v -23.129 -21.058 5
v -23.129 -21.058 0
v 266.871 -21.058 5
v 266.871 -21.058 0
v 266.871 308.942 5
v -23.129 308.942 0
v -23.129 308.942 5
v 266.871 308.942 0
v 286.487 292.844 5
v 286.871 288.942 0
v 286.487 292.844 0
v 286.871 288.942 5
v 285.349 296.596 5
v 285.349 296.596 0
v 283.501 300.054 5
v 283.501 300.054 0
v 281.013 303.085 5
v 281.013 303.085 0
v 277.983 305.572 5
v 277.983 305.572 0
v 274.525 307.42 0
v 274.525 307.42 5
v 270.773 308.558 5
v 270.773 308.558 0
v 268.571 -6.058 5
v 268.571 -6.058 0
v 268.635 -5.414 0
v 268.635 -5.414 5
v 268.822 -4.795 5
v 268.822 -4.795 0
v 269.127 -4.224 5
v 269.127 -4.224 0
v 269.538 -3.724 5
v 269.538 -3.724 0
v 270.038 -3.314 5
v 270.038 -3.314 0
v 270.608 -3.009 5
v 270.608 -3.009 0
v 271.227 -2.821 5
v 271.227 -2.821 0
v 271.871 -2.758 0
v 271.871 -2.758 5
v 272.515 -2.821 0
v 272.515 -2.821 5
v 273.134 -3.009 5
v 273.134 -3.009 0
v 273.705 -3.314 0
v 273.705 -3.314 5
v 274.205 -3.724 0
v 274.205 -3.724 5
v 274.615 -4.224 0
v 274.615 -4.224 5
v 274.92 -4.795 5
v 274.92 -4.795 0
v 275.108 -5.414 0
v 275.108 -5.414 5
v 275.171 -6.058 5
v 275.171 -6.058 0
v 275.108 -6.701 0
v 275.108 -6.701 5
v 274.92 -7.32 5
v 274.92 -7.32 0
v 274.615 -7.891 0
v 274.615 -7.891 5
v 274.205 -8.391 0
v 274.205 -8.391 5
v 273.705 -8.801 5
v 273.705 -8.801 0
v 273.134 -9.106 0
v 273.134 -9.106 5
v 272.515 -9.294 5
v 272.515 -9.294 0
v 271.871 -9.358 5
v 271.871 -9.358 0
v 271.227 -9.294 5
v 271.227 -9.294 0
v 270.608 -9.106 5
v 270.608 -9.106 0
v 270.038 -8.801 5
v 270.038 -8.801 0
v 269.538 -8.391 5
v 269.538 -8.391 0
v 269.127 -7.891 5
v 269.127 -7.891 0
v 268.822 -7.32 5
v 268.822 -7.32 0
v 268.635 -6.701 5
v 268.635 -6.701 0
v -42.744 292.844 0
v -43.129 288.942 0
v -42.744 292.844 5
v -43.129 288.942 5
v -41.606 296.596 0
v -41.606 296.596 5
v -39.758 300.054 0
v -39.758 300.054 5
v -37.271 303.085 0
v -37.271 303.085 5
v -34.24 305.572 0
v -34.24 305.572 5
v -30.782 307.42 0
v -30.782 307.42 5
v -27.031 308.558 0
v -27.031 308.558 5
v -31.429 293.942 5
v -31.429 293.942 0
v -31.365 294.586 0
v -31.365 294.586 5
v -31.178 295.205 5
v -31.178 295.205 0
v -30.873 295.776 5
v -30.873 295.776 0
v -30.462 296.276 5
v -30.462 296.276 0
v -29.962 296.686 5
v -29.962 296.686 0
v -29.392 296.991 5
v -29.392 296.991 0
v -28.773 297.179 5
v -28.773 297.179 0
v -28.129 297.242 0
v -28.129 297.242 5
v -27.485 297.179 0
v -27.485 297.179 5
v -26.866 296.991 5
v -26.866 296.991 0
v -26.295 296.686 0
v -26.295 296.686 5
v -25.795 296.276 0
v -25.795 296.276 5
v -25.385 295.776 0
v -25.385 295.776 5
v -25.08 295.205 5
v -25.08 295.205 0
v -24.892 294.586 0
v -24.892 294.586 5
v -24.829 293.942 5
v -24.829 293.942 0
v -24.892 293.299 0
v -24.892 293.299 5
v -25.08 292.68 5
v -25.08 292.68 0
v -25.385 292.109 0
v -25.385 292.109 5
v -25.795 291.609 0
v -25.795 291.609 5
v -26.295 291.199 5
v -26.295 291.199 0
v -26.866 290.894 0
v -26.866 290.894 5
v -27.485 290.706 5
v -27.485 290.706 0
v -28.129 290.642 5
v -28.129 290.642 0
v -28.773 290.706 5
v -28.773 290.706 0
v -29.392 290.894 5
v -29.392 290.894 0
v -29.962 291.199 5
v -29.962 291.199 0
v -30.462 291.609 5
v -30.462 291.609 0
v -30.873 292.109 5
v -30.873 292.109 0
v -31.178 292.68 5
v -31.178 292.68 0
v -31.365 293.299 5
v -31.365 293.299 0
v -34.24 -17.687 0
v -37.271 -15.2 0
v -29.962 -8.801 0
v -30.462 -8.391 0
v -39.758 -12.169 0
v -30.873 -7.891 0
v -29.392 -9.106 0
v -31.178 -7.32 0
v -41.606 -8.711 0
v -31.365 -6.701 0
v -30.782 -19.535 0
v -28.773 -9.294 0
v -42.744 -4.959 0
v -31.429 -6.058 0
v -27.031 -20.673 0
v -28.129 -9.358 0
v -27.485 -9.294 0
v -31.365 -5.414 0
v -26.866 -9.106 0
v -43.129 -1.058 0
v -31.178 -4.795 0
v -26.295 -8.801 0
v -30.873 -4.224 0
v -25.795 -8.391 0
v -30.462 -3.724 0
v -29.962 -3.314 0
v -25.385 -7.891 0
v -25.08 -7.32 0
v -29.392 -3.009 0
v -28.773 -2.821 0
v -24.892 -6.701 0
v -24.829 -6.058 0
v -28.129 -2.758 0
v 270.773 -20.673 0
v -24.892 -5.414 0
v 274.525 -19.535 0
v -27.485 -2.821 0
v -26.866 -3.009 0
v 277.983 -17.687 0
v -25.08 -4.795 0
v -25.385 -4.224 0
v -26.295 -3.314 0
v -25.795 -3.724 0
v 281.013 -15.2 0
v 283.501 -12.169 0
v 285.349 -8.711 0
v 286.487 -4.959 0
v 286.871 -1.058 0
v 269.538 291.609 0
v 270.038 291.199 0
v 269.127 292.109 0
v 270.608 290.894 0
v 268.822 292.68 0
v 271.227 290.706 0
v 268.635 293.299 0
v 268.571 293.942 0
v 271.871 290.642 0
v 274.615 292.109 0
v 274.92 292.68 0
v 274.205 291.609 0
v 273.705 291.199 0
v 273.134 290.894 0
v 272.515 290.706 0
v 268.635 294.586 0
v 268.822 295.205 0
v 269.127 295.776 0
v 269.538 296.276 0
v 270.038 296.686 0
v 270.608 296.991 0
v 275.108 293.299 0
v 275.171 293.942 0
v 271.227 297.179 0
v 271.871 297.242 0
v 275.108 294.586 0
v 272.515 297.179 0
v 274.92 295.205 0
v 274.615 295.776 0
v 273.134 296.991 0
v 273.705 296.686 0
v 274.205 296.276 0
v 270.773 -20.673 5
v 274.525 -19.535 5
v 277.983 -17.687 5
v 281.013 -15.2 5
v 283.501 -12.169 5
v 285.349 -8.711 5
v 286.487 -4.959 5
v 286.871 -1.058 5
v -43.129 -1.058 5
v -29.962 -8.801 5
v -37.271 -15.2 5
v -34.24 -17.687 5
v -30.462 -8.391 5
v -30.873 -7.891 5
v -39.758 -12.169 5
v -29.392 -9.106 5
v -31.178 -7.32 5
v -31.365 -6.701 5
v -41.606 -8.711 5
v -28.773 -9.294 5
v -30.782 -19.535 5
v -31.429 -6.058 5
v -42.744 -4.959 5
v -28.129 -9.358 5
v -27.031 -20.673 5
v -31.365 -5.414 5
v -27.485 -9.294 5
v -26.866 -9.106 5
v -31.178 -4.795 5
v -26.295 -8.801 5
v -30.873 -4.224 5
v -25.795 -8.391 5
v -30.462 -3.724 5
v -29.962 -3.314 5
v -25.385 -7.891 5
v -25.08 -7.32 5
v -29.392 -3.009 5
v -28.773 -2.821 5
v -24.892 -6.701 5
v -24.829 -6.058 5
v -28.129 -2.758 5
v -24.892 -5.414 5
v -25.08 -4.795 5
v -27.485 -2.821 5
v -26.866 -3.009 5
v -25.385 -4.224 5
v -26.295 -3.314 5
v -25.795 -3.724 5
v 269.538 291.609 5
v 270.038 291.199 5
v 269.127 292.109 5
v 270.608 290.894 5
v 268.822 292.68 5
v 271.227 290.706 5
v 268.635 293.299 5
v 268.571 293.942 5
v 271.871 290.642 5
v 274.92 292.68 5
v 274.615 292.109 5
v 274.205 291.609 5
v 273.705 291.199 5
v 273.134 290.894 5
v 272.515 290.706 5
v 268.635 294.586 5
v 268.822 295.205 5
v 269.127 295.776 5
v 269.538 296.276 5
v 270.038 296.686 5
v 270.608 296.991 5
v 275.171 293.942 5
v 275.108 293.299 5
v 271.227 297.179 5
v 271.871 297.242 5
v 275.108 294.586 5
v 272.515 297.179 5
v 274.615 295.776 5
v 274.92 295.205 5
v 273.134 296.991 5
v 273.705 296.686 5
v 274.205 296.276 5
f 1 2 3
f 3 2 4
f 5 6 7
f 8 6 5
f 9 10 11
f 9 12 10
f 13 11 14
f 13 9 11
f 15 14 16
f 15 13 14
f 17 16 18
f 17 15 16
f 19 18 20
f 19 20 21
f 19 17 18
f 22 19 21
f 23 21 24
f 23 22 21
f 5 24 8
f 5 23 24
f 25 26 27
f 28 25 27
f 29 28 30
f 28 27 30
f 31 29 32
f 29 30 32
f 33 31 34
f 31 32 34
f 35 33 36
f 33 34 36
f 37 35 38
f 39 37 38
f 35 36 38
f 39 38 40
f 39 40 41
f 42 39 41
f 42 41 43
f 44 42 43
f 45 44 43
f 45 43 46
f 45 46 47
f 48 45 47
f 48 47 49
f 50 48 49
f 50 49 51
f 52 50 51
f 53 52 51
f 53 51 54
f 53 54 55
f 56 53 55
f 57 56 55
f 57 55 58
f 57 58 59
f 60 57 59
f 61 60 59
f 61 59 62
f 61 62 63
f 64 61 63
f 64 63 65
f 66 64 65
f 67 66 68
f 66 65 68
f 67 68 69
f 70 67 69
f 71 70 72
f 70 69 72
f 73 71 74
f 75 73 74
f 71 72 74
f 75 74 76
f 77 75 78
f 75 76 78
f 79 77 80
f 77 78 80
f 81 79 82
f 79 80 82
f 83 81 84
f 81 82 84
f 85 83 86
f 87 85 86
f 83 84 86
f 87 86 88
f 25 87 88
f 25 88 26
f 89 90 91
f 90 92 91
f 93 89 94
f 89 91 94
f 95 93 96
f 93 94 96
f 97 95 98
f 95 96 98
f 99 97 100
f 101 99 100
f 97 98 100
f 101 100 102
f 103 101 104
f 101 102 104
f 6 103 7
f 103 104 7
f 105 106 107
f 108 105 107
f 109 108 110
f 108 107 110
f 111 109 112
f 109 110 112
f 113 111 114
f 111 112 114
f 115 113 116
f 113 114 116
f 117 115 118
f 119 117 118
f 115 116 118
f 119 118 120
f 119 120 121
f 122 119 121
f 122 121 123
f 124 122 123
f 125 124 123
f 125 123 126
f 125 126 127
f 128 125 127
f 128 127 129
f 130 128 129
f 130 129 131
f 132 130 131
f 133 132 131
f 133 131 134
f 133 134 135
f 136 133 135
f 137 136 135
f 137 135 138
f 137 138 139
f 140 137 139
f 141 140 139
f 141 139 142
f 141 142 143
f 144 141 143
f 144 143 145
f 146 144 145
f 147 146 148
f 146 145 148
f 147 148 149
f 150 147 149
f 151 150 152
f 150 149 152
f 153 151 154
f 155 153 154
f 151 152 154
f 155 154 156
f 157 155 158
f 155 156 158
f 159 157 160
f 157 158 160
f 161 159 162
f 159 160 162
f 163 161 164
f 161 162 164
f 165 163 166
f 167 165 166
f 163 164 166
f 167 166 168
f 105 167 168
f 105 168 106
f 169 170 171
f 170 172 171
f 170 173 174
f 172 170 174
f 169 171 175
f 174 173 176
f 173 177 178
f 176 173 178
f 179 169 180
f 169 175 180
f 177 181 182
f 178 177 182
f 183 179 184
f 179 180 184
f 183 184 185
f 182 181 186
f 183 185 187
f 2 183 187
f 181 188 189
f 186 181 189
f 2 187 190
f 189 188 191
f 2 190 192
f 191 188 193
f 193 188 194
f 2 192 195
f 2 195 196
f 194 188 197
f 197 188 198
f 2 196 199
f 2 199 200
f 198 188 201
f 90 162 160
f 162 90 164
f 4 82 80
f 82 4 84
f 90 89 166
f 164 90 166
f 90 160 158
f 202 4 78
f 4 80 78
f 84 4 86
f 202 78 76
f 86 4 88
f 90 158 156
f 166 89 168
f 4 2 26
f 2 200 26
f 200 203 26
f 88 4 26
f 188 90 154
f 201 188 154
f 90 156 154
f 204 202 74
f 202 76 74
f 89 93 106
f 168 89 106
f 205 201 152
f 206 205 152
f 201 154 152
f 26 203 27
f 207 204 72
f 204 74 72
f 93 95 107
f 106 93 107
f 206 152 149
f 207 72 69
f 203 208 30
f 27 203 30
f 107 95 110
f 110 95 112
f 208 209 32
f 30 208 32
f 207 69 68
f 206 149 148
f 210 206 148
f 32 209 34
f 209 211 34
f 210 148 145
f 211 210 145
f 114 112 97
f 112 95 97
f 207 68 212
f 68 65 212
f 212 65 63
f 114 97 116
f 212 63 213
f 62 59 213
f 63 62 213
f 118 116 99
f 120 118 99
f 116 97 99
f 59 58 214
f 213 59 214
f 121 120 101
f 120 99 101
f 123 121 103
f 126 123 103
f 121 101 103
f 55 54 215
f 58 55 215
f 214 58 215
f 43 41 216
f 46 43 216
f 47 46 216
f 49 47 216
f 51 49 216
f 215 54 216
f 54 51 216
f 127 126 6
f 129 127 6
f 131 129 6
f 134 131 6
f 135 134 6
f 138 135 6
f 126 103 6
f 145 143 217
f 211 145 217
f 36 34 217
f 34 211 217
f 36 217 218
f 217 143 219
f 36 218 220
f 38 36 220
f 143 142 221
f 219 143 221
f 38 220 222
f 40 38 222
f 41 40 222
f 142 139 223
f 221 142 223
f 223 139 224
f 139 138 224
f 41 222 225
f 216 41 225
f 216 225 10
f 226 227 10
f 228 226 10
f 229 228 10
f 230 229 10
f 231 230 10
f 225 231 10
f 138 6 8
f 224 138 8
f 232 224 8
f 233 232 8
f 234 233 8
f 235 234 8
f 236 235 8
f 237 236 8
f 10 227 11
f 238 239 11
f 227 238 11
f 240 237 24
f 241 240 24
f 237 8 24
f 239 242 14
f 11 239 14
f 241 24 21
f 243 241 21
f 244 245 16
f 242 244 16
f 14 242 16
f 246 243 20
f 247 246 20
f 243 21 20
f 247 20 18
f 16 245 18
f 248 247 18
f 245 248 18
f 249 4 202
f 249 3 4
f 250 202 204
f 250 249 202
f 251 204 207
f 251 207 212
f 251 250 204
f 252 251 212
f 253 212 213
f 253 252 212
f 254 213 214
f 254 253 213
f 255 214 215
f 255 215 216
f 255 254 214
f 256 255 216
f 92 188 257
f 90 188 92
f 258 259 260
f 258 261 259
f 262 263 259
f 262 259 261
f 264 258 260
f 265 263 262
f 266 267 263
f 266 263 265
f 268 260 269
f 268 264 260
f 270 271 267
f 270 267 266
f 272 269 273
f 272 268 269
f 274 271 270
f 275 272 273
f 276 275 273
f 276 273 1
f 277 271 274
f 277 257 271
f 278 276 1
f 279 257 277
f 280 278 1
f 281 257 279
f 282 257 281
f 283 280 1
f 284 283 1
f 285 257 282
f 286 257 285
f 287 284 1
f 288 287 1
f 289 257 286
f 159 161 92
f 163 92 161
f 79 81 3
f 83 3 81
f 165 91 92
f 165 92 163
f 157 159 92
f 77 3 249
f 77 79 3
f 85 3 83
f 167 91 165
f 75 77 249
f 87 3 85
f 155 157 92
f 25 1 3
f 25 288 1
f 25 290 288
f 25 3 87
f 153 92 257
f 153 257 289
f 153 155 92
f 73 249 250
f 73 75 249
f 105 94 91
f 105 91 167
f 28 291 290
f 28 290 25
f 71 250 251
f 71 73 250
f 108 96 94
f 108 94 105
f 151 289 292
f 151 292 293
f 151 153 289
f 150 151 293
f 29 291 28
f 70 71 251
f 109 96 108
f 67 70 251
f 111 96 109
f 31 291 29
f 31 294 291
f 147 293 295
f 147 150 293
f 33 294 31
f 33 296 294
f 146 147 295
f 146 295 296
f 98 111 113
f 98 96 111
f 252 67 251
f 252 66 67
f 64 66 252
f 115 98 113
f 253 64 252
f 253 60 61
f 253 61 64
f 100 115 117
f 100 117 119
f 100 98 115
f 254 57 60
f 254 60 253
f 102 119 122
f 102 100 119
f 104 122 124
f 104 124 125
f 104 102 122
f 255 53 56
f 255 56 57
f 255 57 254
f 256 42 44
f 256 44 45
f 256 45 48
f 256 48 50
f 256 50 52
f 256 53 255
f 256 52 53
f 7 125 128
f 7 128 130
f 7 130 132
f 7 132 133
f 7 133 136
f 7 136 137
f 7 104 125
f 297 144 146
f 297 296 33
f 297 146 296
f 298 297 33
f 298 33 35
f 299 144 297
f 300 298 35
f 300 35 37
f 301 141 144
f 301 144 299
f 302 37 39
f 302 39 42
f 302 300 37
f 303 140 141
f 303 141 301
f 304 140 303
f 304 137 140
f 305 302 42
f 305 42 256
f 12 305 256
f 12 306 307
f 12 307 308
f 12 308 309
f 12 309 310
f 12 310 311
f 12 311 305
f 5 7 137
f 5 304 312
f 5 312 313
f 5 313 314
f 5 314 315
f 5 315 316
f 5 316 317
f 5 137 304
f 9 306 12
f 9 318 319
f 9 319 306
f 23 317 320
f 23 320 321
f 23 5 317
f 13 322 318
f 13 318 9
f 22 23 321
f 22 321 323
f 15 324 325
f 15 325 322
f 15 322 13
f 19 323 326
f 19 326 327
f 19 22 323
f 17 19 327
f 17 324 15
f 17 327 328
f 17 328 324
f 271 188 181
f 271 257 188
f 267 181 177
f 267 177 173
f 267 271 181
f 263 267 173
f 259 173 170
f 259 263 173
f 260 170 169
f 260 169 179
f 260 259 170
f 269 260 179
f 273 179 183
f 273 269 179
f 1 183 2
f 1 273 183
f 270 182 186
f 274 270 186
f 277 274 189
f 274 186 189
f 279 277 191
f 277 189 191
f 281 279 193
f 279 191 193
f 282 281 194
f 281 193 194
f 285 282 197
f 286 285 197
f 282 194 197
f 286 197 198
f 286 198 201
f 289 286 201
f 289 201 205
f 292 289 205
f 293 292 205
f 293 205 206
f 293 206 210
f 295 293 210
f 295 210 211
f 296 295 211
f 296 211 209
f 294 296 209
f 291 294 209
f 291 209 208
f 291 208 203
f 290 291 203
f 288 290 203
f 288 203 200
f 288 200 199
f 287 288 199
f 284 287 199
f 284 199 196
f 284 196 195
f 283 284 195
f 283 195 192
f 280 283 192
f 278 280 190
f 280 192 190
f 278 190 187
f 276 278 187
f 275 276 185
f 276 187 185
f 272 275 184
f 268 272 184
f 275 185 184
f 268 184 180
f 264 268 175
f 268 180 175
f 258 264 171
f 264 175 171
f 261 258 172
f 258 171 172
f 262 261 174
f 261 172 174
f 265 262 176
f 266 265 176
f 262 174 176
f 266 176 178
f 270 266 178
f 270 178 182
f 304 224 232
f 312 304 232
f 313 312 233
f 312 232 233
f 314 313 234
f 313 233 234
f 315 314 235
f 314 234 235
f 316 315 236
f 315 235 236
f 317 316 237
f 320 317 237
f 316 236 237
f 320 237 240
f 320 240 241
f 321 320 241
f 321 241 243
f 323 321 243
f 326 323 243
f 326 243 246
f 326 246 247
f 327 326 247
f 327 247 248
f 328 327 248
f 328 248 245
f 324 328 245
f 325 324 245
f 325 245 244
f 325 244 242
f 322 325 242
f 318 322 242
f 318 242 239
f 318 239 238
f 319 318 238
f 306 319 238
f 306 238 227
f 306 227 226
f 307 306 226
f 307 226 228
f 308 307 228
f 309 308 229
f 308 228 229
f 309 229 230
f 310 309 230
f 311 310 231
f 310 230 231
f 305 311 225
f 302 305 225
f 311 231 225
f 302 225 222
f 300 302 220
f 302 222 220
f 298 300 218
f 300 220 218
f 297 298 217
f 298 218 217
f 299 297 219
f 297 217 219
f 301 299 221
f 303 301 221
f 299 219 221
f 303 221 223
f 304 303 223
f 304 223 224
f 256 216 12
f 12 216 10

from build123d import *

# Parameters (mm, degrees)
SKETCH_1_W          = 330
SKETCH_1_H          = 330
EXTRUDE_1_DEPTH     = 5
FILLET_1_R          = 20
SKETCH_2_R          = 3.3
CUT_EXTRUDE_1_DEPTH = 10


with BuildPart() as part:
    # 草图1 → 凸台-拉伸1 (new body)
    with BuildSketch(Plane.XY):
        with Locations((121.871247651, 143.942488789)):
            Rectangle(SKETCH_1_W, SKETCH_1_H)
    extrude(amount=EXTRUDE_1_DEPTH)

    # 圆角1
    fillet_1_edges = [part.edges().sort_by_distance(p)[0] for p in [
        (-43.128752349, 308.942488789, 2.5),
        (286.871247651, 308.942488789, 2.5),
        (286.871247651, -21.057511211, 2.5),
        (-43.128752349, -21.057511211, 2.5),
    ]]
    fillet(fillet_1_edges, radius=FILLET_1_R)

    # 草图2 → 切除-拉伸1 (cut)
    with BuildSketch(Plane(origin=(0, 0, 0), x_dir=(-1, 0, 0), z_dir=(0, 0, -1))):
        with Locations((28.128752349, -6.057511211)):
            Circle(SKETCH_2_R)
        with Locations((-271.871247651, -6.057511211)):
            Circle(SKETCH_2_R)
        with Locations((-271.871247651, 293.942488789)):
            Circle(SKETCH_2_R)
        with Locations((28.128752349, 293.942488789)):
            Circle(SKETCH_2_R)
    extrude(amount=-CUT_EXTRUDE_1_DEPTH, mode=Mode.SUBTRACT)


solid = part.part
